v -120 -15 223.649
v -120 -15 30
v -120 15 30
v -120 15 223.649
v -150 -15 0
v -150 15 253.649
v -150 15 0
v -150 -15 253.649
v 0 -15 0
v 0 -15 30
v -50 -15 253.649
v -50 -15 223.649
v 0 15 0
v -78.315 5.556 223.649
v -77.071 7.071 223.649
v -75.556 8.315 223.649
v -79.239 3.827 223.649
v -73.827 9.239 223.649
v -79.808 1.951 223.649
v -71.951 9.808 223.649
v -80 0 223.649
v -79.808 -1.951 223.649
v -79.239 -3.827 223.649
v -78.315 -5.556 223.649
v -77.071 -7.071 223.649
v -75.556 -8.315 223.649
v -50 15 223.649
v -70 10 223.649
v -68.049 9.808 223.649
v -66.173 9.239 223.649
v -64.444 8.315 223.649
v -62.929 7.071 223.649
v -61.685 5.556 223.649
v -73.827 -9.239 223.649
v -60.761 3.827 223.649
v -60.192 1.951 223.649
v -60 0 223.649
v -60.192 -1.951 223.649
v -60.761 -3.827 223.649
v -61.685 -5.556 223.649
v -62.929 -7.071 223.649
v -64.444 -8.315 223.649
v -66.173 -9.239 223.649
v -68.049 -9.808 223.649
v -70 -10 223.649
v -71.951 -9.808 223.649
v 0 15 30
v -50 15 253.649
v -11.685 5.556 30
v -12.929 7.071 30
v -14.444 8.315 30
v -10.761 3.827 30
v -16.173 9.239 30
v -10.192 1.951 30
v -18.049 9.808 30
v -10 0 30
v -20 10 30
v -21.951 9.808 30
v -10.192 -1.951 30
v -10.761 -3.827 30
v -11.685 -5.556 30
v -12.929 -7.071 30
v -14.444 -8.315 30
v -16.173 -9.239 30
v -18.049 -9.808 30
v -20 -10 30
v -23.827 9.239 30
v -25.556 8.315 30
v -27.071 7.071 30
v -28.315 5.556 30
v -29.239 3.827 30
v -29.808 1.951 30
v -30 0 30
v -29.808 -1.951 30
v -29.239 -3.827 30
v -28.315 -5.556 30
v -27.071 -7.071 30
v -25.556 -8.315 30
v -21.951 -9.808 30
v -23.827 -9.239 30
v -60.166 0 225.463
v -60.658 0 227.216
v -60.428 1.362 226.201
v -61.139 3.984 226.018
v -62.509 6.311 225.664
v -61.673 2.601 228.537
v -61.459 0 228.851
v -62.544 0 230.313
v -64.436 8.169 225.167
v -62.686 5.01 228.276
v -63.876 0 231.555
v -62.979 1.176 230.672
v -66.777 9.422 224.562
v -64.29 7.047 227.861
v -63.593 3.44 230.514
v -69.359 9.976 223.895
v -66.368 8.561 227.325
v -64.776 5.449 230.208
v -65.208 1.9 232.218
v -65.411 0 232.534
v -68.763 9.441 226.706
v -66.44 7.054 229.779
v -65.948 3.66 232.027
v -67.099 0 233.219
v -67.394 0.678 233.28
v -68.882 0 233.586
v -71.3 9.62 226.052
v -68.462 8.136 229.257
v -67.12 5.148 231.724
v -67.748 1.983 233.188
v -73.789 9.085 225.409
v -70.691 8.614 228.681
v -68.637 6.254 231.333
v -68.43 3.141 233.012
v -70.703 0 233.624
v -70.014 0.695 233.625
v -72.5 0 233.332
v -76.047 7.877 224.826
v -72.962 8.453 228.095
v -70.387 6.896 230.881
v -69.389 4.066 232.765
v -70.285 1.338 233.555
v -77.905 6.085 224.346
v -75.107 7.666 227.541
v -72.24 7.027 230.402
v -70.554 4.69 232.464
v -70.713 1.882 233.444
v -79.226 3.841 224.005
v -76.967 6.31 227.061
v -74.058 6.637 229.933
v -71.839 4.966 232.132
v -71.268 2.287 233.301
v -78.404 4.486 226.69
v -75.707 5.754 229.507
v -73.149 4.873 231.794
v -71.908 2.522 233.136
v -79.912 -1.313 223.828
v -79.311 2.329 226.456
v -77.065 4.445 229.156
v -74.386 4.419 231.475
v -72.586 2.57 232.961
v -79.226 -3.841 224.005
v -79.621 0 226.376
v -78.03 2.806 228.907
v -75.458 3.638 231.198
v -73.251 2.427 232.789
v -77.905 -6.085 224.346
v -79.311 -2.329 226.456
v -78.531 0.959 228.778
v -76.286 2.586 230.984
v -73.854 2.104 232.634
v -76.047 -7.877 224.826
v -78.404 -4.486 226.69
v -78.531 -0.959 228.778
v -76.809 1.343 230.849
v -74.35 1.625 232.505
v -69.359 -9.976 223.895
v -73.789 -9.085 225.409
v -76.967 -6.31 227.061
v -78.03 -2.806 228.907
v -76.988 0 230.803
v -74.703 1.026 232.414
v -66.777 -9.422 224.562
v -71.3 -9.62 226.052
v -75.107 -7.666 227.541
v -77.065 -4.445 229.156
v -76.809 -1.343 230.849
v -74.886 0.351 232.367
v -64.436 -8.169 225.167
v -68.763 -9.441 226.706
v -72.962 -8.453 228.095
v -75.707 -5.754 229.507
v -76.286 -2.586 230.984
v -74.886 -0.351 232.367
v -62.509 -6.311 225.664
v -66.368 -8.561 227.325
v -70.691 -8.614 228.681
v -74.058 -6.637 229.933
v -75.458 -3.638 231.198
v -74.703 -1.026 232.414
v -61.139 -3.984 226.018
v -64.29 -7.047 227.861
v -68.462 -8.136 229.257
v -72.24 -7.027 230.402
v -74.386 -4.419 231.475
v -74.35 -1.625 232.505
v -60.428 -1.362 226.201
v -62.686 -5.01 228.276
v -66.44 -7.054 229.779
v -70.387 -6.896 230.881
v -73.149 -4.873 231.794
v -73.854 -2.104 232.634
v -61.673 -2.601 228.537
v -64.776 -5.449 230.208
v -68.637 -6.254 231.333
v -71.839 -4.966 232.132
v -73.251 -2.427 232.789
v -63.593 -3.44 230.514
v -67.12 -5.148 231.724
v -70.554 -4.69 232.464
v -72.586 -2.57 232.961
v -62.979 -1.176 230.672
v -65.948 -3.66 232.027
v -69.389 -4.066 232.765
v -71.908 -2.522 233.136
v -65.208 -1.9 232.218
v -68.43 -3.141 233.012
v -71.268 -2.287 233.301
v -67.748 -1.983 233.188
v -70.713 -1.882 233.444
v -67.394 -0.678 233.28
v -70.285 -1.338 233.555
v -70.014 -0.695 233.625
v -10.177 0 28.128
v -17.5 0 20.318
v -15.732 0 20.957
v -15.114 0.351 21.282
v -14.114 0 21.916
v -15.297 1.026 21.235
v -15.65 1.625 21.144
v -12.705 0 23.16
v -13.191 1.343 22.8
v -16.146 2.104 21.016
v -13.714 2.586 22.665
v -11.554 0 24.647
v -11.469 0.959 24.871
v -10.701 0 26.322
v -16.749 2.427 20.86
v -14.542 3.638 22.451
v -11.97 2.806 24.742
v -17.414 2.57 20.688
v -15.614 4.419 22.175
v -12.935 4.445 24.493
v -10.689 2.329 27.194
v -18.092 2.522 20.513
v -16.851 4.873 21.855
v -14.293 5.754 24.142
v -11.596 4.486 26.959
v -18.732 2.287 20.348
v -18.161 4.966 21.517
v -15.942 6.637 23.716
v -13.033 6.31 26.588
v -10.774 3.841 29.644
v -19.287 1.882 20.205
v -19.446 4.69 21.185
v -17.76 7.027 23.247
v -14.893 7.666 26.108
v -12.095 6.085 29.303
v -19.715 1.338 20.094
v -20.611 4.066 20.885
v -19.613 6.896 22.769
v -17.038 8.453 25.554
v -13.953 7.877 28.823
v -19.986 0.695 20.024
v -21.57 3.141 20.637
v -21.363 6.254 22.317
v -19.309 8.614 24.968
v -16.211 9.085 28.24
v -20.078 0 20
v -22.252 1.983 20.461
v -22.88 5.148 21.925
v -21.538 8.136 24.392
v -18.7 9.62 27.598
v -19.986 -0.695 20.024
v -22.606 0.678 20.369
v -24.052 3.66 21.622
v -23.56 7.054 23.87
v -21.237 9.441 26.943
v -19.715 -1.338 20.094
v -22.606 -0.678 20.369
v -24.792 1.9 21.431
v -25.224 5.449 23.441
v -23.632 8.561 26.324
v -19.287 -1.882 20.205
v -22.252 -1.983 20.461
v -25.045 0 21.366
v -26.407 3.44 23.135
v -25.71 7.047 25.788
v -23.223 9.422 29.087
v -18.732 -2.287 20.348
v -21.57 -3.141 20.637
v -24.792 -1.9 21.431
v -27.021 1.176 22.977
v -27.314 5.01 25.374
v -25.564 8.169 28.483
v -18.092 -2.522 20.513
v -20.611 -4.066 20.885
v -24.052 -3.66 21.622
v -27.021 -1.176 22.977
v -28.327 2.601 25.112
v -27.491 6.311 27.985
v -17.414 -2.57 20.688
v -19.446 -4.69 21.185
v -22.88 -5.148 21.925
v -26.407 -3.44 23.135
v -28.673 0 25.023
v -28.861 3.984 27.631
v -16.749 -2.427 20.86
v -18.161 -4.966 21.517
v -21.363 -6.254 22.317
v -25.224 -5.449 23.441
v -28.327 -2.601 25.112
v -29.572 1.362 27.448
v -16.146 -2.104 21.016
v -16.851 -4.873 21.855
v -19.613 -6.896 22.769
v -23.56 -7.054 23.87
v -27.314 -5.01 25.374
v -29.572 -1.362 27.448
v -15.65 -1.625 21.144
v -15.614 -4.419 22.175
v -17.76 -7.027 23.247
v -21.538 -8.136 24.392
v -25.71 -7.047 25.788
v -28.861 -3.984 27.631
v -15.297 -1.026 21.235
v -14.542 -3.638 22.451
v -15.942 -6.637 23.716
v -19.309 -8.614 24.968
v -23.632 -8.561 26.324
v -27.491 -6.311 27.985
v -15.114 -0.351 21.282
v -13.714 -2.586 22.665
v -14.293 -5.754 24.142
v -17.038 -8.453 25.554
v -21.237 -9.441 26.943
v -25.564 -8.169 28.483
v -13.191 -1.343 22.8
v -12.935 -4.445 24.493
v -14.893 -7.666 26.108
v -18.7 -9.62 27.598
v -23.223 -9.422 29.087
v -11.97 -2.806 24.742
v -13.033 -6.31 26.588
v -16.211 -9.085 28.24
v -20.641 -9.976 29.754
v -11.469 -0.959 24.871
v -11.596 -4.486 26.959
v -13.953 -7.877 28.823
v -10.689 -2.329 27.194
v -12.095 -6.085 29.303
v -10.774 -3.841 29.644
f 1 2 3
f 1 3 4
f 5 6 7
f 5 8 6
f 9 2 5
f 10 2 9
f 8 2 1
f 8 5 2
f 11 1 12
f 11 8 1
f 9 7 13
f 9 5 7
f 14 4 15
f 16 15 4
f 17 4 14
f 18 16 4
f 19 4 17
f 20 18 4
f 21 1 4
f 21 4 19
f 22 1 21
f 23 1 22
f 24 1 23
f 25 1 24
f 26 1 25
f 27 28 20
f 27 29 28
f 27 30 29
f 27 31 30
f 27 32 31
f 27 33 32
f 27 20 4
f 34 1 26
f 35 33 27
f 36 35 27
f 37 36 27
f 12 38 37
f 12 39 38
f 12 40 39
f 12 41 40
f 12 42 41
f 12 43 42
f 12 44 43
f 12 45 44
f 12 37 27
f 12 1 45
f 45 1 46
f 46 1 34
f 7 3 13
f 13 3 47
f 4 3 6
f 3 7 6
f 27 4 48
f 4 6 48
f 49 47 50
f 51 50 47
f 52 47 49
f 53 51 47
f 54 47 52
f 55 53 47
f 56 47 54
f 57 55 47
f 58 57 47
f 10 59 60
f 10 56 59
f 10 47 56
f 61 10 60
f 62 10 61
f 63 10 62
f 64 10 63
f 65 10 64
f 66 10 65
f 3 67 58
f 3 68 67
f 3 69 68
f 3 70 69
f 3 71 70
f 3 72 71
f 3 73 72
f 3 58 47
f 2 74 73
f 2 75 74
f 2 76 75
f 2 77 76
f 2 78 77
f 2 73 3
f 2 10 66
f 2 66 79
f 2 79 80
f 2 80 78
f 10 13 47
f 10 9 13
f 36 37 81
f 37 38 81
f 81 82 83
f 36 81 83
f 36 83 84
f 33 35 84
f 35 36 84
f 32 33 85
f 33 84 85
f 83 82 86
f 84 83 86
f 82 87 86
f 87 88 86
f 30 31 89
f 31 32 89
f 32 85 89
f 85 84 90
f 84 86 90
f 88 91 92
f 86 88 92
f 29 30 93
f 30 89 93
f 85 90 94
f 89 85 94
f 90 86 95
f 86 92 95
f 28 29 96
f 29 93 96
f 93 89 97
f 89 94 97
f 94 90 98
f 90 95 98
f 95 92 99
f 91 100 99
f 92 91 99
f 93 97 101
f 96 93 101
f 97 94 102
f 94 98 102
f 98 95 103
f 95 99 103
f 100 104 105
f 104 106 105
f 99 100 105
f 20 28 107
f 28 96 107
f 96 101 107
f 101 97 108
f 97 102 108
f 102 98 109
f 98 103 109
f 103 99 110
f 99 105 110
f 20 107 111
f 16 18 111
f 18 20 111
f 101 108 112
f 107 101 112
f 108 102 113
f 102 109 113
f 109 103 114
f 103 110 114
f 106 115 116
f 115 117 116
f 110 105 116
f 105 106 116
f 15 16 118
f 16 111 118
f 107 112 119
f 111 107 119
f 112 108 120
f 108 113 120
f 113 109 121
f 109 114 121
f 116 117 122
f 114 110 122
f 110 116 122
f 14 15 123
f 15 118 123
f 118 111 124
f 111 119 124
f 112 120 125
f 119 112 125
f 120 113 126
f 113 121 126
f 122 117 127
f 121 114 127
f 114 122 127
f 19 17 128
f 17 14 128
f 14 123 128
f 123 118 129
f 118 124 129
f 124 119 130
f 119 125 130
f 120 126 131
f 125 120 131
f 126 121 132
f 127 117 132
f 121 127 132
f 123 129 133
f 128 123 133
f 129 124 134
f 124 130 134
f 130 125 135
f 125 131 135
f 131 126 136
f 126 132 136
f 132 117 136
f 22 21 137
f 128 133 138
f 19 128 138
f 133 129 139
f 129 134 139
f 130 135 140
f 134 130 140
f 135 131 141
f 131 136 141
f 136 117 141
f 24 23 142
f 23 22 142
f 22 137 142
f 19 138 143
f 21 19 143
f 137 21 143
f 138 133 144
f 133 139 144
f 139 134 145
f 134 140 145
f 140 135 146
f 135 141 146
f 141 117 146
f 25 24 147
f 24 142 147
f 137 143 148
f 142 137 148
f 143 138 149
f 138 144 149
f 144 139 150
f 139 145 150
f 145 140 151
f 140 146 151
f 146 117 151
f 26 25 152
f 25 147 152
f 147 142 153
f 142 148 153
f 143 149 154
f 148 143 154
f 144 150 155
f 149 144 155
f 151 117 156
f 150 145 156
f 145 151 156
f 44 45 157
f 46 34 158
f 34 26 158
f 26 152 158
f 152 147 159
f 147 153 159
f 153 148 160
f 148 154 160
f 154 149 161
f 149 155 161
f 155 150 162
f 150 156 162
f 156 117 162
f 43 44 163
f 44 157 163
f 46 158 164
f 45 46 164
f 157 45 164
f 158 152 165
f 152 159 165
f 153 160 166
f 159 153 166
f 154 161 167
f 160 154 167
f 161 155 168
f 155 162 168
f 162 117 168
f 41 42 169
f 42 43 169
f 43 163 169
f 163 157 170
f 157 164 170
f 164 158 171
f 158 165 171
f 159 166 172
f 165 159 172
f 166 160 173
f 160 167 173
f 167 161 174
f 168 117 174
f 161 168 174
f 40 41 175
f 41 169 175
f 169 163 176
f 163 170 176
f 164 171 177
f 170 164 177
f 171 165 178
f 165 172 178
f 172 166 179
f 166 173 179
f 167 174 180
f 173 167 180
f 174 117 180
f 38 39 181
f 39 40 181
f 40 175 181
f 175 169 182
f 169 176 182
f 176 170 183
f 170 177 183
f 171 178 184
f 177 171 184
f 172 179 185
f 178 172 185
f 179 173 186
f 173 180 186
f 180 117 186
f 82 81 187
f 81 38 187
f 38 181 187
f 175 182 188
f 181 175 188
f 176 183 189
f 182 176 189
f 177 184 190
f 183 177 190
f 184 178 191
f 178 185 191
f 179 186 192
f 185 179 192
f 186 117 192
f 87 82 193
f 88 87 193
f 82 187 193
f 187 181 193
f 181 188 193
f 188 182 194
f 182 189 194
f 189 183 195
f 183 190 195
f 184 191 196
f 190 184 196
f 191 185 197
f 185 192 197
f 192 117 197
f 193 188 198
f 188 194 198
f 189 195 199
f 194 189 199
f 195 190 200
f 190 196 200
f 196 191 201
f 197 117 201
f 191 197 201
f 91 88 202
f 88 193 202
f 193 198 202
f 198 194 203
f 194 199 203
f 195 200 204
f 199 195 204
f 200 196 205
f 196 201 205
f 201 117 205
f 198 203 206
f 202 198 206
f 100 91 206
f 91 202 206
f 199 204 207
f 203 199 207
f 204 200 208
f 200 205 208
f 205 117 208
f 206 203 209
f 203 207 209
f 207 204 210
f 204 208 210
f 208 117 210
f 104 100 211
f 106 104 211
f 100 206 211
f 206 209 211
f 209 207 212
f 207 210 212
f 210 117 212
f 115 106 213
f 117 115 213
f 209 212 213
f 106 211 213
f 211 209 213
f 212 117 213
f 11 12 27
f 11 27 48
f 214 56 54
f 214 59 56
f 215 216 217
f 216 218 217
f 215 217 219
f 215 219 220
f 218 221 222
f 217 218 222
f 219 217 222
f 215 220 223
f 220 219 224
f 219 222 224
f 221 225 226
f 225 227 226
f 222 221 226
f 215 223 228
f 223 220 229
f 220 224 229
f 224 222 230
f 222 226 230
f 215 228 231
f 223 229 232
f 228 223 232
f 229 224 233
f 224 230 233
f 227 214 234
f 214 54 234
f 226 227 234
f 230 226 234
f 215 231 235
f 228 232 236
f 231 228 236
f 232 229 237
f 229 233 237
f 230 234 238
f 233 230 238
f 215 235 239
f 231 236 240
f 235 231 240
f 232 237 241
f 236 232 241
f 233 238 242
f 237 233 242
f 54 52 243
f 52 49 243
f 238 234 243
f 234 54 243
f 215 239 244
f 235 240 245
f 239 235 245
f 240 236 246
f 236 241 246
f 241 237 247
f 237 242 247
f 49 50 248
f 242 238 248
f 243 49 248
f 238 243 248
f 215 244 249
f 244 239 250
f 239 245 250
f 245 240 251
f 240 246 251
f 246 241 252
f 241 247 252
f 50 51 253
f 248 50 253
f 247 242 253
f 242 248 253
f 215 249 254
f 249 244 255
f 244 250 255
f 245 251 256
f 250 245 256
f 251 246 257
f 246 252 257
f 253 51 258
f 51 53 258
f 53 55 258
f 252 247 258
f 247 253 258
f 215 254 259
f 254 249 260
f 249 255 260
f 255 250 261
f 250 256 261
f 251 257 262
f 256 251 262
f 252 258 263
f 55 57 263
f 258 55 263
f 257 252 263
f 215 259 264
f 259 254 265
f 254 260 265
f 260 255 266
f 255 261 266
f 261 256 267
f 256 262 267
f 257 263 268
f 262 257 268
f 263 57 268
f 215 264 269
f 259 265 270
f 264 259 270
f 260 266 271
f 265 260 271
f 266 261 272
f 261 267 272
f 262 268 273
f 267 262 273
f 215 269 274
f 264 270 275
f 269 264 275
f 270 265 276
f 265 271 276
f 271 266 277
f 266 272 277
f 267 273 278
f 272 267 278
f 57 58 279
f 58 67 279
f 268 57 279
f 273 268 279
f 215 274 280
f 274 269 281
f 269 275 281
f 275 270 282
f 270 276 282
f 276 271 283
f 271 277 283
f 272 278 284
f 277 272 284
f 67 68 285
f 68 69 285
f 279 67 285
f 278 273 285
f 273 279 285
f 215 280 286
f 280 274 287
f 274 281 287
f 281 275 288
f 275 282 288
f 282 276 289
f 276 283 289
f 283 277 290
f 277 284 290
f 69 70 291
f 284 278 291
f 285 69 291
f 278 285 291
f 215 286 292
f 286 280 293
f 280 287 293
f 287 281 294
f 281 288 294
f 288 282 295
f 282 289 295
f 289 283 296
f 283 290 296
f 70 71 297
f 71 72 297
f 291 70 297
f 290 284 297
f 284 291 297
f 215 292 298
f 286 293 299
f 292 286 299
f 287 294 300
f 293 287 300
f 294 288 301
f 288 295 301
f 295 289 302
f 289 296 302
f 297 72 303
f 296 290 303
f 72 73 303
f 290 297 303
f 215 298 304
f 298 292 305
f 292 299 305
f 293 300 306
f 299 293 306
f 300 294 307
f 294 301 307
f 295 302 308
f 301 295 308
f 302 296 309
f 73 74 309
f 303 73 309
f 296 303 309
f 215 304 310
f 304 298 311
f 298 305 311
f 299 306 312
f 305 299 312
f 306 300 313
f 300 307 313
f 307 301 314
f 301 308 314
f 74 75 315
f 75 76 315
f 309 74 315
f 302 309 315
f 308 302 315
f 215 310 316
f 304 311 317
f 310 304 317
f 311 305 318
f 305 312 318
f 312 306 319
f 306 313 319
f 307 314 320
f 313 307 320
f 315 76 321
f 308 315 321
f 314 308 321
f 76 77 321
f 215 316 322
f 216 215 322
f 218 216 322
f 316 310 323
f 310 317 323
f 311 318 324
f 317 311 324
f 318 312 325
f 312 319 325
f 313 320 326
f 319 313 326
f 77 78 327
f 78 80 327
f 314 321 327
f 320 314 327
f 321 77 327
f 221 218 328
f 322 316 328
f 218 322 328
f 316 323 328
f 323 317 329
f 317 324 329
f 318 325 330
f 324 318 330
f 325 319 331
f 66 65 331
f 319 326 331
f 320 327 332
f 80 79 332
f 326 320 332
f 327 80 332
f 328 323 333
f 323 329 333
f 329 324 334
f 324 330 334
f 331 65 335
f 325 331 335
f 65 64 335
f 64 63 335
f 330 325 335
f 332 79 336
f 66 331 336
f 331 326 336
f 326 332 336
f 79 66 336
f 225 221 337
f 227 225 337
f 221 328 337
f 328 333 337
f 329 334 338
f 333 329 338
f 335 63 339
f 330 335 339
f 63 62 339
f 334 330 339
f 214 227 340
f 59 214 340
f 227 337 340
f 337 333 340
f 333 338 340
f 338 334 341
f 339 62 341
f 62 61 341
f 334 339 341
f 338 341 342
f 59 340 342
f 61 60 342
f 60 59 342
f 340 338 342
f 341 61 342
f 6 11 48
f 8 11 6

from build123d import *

# Parameters (mm, degrees)
F1_DEPTH = 15


with BuildPart() as f1:
    # F0 (on Front) → F1 (new body, symmetric)
    with BuildSketch(Plane.XZ):
        Polygon((0, 0), (0, 30), (-120, 30), (-120, 223.6491673104), (-50, 223.6491673104), (-50, 253.6491673104), (-150, 253.6491673104), (-150, 0), align=None)
    extrude(amount=F1_DEPTH, both=True)

    # F2 (on Front) → F3 (revolve, cut)
    with BuildSketch(Plane.XZ):
        with BuildLine():
            Line((-22.5, 39.6824583655), (-17.5, 20.3175416345))
            ThreePointArc((-17.5, 20.3175416345), (-10.3175416345, 32.5), (-22.5, 39.6824583655))
        make_face()
        with BuildLine():
            Line((-72.5, 233.3316256759), (-67.5, 213.9667089449))
            ThreePointArc((-67.5, 213.9667089449), (-60.3175416345, 226.1491673104), (-72.5, 233.3316256759))
        make_face()
    revolve(axis=Axis((-45, 0, 126.8245836552), (-0.25, 0, 0.9682458366)), mode=Mode.SUBTRACT)


solid = f1.part
